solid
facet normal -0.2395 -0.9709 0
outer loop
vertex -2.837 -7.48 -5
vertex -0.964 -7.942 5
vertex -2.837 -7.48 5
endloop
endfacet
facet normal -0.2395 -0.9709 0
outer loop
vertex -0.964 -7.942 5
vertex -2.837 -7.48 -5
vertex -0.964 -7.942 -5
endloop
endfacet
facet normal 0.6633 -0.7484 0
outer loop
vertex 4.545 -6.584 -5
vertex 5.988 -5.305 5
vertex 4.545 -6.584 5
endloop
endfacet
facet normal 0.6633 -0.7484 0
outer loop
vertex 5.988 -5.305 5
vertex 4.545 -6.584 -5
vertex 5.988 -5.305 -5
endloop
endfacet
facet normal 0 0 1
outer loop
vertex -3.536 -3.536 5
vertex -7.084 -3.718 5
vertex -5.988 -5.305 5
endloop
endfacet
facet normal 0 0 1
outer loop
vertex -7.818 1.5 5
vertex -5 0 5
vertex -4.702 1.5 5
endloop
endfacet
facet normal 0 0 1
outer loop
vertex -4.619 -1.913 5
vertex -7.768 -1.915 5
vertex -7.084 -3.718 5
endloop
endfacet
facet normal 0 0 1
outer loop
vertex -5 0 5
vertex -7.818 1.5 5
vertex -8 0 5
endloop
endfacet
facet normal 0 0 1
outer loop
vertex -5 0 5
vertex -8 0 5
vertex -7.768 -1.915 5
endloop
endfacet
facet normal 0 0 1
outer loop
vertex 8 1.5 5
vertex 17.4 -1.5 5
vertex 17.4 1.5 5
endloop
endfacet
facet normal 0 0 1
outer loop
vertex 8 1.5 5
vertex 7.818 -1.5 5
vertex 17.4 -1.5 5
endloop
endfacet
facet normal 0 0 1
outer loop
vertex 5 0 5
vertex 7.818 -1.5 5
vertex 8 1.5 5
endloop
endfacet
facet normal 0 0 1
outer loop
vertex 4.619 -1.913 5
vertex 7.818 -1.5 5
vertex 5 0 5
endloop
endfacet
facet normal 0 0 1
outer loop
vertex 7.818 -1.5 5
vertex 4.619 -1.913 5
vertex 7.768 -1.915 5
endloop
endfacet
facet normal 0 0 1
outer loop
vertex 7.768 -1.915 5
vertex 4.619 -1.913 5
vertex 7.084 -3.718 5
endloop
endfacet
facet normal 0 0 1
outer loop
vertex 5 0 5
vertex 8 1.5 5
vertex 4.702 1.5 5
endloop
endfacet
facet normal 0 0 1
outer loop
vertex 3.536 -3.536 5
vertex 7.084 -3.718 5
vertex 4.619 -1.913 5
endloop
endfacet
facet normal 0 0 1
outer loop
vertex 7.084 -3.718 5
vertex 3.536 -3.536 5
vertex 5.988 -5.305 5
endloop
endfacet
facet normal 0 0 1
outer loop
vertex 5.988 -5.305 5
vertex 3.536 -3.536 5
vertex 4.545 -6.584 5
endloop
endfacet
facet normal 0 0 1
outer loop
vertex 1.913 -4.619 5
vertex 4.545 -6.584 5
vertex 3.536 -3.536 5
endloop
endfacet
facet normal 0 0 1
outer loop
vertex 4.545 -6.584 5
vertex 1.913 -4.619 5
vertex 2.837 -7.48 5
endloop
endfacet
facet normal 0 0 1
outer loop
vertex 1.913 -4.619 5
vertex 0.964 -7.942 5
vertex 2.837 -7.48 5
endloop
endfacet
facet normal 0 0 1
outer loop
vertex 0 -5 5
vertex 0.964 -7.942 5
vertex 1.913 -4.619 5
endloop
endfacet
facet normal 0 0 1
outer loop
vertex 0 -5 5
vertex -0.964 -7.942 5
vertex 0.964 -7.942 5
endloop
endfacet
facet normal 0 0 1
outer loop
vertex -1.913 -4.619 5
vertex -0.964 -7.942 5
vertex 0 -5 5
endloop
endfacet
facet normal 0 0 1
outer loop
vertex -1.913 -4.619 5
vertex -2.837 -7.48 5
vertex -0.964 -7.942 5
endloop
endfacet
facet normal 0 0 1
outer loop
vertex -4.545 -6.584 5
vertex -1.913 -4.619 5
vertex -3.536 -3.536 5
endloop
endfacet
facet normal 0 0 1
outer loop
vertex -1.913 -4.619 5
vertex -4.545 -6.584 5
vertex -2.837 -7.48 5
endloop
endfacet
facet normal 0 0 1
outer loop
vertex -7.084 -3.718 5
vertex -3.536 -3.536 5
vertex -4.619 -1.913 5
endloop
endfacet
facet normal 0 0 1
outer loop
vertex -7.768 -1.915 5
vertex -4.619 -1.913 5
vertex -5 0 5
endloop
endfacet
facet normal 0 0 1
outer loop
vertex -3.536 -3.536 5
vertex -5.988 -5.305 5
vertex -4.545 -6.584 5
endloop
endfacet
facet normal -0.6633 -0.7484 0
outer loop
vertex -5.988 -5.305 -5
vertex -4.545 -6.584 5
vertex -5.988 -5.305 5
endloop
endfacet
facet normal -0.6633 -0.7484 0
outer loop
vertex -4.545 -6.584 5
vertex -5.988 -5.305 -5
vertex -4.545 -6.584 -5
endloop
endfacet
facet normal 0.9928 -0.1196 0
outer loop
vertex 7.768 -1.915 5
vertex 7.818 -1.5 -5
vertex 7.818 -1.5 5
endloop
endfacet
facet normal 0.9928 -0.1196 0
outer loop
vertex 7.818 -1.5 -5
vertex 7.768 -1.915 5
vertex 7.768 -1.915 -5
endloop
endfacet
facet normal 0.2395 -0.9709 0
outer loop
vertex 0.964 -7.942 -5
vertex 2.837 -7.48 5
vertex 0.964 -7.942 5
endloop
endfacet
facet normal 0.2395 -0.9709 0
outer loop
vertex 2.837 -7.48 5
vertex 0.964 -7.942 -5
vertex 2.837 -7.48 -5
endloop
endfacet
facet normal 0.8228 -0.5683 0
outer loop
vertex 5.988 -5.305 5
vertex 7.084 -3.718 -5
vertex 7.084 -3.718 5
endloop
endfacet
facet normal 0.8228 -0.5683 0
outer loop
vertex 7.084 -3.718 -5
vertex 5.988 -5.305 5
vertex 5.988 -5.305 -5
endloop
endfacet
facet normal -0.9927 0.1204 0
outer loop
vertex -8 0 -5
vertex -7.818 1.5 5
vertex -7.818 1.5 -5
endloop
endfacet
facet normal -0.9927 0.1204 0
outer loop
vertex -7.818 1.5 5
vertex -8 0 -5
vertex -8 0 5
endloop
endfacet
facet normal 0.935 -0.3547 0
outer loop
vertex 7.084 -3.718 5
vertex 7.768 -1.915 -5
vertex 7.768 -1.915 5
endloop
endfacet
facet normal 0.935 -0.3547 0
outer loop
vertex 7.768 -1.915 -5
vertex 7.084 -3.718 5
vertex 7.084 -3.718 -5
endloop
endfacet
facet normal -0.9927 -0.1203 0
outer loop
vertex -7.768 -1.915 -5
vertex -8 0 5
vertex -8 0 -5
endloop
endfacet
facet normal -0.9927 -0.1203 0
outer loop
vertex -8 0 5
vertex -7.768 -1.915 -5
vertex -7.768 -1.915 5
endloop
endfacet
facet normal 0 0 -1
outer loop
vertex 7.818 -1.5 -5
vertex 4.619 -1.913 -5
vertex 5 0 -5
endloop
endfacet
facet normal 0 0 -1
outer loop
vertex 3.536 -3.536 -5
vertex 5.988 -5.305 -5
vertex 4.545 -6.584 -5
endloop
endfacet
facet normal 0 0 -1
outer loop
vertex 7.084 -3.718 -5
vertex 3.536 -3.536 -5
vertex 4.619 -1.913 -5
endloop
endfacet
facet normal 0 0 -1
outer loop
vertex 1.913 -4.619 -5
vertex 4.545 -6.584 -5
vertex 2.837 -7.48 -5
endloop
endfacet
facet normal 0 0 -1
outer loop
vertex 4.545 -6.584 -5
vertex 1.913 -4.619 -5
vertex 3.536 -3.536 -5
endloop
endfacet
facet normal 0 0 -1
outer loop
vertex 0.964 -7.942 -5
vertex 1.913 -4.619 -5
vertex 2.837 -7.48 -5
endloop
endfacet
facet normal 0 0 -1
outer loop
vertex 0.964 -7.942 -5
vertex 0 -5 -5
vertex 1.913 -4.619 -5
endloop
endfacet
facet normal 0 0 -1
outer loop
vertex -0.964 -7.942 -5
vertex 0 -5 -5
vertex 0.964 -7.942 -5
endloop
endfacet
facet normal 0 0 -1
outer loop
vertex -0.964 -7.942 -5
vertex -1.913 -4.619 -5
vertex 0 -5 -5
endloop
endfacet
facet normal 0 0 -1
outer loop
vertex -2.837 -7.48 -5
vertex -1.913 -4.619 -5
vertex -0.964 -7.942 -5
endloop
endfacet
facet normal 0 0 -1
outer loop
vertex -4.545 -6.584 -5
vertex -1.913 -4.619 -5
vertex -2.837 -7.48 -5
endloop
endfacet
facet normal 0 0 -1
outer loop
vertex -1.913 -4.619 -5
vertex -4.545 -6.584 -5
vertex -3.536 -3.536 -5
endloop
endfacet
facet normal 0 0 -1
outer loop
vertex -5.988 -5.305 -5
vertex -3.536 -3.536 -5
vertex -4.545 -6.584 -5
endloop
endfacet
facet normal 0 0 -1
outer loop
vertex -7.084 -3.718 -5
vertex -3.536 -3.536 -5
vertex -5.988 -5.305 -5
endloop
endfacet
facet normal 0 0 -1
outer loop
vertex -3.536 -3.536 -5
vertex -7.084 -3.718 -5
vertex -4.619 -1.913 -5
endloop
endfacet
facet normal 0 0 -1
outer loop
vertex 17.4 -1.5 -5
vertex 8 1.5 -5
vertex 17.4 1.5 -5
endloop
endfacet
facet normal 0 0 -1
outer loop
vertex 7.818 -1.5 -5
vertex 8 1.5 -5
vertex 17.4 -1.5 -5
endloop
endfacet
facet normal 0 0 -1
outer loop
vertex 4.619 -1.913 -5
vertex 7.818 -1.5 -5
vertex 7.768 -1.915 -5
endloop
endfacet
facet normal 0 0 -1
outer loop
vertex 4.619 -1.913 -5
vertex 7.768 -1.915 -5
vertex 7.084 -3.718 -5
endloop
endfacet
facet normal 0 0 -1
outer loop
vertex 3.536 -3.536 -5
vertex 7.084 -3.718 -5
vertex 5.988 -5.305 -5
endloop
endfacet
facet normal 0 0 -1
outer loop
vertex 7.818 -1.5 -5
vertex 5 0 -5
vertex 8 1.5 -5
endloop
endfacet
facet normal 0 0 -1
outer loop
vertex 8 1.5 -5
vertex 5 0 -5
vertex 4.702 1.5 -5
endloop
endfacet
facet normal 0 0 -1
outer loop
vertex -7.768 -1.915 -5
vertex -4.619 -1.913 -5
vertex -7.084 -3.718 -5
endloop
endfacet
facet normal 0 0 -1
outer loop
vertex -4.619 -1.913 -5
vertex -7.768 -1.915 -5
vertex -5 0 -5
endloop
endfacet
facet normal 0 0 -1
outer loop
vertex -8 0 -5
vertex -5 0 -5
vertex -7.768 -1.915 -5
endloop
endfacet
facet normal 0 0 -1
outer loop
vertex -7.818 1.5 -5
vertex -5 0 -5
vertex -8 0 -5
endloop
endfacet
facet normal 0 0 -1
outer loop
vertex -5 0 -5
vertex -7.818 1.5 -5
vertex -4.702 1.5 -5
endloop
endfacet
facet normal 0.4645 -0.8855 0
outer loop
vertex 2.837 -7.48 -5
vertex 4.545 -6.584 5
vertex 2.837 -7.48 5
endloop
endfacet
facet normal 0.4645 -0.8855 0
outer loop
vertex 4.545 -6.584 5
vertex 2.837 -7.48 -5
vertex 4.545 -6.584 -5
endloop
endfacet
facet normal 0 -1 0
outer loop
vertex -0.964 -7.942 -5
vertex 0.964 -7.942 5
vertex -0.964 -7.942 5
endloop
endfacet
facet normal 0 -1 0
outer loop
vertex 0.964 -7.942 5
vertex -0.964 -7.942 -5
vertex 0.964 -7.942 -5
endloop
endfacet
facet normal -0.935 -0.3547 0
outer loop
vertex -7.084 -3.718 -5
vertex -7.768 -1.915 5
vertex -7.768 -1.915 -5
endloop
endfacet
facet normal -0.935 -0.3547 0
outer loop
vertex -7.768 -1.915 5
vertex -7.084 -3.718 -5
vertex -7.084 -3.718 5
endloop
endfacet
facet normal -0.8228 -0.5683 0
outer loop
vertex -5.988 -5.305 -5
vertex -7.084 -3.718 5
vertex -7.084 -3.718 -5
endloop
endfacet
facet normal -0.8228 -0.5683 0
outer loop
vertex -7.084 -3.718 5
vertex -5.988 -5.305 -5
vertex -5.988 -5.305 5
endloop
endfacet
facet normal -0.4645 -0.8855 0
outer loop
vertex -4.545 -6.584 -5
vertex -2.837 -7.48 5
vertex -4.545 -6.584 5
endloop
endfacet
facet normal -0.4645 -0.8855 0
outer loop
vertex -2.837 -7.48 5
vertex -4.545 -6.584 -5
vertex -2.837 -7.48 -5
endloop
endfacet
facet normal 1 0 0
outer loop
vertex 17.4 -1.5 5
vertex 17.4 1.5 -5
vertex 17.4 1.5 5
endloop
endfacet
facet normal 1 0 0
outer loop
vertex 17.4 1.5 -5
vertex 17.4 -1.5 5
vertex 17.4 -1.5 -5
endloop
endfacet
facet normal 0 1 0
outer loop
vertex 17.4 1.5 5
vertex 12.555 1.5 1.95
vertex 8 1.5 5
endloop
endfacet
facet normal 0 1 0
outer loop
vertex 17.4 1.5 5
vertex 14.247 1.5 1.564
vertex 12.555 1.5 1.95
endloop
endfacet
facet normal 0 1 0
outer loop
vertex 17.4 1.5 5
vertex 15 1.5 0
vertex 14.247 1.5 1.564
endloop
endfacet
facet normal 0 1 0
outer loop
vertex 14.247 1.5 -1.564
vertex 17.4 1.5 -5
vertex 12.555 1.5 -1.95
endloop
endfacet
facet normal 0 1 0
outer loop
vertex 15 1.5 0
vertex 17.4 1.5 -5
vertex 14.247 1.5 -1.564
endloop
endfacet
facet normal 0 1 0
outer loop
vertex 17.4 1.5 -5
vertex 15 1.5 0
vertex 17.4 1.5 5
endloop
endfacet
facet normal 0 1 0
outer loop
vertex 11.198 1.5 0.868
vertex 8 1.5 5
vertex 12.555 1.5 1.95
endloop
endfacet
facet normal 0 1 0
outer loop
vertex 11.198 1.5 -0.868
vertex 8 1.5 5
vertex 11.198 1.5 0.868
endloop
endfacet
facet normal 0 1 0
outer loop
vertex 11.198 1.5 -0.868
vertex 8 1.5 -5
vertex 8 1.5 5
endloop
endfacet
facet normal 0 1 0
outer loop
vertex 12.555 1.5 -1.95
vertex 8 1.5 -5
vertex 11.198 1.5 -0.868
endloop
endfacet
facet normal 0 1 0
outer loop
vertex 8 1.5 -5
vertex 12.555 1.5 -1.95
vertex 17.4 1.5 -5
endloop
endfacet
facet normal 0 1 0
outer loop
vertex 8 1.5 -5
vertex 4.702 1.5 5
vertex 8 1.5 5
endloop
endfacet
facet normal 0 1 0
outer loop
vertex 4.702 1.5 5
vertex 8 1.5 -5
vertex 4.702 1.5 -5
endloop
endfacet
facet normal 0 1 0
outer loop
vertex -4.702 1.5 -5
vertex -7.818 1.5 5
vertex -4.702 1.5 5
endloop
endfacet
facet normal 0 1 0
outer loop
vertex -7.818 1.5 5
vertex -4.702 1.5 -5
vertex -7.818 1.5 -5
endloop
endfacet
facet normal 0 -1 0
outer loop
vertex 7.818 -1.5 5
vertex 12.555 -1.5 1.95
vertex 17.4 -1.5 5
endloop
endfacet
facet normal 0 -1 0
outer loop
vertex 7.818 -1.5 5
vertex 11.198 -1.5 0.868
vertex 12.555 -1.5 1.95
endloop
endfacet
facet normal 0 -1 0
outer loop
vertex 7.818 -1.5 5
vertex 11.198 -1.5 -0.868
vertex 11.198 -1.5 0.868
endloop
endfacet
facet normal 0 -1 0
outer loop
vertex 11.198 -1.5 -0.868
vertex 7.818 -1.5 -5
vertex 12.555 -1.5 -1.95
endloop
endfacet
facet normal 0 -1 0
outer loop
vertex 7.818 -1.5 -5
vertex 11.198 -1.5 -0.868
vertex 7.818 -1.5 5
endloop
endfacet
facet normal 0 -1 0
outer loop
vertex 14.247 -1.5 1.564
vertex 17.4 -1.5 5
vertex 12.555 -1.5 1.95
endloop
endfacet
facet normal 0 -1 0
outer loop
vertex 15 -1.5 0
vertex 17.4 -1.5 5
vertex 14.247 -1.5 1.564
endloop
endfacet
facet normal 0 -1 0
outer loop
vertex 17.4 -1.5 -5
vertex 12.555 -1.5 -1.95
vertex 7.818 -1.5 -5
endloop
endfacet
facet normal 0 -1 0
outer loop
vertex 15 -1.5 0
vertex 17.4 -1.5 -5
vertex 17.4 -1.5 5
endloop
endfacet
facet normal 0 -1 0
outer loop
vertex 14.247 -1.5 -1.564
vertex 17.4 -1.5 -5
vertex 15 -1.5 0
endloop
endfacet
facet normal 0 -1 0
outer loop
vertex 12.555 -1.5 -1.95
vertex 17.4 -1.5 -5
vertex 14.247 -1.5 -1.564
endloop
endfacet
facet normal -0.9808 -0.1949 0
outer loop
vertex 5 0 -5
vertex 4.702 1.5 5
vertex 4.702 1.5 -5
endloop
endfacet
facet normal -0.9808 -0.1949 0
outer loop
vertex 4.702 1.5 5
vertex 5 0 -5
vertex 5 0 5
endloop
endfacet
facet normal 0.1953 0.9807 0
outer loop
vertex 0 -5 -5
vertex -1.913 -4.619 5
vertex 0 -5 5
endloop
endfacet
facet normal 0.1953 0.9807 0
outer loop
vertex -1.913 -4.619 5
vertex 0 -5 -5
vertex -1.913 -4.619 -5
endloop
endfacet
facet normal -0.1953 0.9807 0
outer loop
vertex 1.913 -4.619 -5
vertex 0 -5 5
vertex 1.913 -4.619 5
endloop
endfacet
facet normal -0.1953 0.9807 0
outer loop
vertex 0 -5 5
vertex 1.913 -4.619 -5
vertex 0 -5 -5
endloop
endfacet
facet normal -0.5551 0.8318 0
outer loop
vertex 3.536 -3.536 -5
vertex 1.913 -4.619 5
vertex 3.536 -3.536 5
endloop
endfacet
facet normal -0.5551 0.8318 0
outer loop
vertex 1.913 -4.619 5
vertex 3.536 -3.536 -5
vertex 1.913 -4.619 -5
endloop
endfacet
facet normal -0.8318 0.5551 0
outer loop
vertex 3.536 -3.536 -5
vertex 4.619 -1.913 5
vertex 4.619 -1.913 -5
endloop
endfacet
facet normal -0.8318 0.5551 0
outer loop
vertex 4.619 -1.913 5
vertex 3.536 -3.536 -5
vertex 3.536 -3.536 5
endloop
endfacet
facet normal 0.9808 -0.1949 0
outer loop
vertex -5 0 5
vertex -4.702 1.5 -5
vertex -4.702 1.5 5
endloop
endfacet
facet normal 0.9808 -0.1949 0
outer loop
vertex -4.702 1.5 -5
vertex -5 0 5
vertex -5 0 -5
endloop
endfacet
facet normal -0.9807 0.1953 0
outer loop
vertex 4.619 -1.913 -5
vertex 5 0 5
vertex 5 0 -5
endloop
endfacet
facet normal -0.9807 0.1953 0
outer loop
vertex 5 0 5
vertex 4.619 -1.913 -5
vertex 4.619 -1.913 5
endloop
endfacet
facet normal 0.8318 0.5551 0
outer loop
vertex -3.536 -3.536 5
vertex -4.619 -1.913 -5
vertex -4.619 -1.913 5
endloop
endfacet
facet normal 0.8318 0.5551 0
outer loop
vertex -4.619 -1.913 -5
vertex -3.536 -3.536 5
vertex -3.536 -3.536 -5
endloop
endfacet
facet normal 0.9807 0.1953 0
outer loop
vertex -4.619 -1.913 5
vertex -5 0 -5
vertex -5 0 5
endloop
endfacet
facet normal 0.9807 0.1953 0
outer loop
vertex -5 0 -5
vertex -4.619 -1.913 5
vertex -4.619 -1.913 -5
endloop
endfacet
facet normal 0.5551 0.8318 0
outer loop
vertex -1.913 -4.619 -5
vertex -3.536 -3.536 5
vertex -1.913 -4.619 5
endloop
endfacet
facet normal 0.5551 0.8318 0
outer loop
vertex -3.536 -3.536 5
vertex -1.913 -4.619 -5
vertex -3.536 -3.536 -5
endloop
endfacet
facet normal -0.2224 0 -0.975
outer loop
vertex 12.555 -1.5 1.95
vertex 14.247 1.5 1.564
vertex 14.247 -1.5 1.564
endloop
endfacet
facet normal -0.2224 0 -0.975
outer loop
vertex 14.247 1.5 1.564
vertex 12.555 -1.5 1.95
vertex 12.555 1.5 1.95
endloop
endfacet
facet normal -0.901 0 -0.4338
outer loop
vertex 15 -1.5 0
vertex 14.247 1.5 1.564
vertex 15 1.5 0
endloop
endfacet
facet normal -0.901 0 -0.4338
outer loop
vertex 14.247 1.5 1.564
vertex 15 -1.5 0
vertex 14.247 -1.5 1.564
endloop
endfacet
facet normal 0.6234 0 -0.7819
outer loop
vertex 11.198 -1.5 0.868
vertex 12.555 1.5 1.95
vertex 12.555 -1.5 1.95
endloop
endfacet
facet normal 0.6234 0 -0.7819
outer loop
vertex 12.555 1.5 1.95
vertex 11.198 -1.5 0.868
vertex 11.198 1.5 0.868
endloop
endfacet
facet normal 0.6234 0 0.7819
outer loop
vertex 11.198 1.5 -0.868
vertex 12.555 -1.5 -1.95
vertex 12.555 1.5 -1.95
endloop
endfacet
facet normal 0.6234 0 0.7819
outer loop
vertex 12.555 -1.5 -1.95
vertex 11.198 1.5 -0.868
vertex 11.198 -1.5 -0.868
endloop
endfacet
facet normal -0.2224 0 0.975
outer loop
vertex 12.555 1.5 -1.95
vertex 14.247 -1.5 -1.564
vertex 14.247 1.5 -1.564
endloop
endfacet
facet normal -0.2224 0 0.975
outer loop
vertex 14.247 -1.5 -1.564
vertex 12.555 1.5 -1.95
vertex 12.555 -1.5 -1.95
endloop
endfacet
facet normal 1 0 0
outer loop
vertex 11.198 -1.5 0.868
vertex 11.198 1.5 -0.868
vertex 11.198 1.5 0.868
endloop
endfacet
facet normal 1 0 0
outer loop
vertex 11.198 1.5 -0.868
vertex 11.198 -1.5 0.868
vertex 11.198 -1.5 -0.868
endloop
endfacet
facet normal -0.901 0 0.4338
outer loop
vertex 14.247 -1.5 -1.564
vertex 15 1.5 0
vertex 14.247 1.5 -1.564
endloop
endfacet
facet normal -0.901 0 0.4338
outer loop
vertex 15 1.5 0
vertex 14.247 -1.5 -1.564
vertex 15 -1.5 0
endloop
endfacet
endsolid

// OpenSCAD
wire_harness(10, 3, 10);

module wire_harness(dia, thickness, height)
{
	difference()
	{
		union()
		{
			cylinder(r=dia/2+thickness, h=height, center = true);
			
			translate([dia/2+thickness+height/2-1.1,0,0])
				cube(size=[height+1, thickness, height], center=true);
		}

		cylinder(r=dia/2, h=height, center = true);
		translate([0, dia/2+ thickness*1.5, 0])
			cube(size=[dia+thickness*2, dia+thickness*2, height], center=true);

		translate([(dia+thickness), 0, 0])
			rotate([90, 0, 0])
				cylinder(r=2, h=thickness+1, center=true);
	}
}
